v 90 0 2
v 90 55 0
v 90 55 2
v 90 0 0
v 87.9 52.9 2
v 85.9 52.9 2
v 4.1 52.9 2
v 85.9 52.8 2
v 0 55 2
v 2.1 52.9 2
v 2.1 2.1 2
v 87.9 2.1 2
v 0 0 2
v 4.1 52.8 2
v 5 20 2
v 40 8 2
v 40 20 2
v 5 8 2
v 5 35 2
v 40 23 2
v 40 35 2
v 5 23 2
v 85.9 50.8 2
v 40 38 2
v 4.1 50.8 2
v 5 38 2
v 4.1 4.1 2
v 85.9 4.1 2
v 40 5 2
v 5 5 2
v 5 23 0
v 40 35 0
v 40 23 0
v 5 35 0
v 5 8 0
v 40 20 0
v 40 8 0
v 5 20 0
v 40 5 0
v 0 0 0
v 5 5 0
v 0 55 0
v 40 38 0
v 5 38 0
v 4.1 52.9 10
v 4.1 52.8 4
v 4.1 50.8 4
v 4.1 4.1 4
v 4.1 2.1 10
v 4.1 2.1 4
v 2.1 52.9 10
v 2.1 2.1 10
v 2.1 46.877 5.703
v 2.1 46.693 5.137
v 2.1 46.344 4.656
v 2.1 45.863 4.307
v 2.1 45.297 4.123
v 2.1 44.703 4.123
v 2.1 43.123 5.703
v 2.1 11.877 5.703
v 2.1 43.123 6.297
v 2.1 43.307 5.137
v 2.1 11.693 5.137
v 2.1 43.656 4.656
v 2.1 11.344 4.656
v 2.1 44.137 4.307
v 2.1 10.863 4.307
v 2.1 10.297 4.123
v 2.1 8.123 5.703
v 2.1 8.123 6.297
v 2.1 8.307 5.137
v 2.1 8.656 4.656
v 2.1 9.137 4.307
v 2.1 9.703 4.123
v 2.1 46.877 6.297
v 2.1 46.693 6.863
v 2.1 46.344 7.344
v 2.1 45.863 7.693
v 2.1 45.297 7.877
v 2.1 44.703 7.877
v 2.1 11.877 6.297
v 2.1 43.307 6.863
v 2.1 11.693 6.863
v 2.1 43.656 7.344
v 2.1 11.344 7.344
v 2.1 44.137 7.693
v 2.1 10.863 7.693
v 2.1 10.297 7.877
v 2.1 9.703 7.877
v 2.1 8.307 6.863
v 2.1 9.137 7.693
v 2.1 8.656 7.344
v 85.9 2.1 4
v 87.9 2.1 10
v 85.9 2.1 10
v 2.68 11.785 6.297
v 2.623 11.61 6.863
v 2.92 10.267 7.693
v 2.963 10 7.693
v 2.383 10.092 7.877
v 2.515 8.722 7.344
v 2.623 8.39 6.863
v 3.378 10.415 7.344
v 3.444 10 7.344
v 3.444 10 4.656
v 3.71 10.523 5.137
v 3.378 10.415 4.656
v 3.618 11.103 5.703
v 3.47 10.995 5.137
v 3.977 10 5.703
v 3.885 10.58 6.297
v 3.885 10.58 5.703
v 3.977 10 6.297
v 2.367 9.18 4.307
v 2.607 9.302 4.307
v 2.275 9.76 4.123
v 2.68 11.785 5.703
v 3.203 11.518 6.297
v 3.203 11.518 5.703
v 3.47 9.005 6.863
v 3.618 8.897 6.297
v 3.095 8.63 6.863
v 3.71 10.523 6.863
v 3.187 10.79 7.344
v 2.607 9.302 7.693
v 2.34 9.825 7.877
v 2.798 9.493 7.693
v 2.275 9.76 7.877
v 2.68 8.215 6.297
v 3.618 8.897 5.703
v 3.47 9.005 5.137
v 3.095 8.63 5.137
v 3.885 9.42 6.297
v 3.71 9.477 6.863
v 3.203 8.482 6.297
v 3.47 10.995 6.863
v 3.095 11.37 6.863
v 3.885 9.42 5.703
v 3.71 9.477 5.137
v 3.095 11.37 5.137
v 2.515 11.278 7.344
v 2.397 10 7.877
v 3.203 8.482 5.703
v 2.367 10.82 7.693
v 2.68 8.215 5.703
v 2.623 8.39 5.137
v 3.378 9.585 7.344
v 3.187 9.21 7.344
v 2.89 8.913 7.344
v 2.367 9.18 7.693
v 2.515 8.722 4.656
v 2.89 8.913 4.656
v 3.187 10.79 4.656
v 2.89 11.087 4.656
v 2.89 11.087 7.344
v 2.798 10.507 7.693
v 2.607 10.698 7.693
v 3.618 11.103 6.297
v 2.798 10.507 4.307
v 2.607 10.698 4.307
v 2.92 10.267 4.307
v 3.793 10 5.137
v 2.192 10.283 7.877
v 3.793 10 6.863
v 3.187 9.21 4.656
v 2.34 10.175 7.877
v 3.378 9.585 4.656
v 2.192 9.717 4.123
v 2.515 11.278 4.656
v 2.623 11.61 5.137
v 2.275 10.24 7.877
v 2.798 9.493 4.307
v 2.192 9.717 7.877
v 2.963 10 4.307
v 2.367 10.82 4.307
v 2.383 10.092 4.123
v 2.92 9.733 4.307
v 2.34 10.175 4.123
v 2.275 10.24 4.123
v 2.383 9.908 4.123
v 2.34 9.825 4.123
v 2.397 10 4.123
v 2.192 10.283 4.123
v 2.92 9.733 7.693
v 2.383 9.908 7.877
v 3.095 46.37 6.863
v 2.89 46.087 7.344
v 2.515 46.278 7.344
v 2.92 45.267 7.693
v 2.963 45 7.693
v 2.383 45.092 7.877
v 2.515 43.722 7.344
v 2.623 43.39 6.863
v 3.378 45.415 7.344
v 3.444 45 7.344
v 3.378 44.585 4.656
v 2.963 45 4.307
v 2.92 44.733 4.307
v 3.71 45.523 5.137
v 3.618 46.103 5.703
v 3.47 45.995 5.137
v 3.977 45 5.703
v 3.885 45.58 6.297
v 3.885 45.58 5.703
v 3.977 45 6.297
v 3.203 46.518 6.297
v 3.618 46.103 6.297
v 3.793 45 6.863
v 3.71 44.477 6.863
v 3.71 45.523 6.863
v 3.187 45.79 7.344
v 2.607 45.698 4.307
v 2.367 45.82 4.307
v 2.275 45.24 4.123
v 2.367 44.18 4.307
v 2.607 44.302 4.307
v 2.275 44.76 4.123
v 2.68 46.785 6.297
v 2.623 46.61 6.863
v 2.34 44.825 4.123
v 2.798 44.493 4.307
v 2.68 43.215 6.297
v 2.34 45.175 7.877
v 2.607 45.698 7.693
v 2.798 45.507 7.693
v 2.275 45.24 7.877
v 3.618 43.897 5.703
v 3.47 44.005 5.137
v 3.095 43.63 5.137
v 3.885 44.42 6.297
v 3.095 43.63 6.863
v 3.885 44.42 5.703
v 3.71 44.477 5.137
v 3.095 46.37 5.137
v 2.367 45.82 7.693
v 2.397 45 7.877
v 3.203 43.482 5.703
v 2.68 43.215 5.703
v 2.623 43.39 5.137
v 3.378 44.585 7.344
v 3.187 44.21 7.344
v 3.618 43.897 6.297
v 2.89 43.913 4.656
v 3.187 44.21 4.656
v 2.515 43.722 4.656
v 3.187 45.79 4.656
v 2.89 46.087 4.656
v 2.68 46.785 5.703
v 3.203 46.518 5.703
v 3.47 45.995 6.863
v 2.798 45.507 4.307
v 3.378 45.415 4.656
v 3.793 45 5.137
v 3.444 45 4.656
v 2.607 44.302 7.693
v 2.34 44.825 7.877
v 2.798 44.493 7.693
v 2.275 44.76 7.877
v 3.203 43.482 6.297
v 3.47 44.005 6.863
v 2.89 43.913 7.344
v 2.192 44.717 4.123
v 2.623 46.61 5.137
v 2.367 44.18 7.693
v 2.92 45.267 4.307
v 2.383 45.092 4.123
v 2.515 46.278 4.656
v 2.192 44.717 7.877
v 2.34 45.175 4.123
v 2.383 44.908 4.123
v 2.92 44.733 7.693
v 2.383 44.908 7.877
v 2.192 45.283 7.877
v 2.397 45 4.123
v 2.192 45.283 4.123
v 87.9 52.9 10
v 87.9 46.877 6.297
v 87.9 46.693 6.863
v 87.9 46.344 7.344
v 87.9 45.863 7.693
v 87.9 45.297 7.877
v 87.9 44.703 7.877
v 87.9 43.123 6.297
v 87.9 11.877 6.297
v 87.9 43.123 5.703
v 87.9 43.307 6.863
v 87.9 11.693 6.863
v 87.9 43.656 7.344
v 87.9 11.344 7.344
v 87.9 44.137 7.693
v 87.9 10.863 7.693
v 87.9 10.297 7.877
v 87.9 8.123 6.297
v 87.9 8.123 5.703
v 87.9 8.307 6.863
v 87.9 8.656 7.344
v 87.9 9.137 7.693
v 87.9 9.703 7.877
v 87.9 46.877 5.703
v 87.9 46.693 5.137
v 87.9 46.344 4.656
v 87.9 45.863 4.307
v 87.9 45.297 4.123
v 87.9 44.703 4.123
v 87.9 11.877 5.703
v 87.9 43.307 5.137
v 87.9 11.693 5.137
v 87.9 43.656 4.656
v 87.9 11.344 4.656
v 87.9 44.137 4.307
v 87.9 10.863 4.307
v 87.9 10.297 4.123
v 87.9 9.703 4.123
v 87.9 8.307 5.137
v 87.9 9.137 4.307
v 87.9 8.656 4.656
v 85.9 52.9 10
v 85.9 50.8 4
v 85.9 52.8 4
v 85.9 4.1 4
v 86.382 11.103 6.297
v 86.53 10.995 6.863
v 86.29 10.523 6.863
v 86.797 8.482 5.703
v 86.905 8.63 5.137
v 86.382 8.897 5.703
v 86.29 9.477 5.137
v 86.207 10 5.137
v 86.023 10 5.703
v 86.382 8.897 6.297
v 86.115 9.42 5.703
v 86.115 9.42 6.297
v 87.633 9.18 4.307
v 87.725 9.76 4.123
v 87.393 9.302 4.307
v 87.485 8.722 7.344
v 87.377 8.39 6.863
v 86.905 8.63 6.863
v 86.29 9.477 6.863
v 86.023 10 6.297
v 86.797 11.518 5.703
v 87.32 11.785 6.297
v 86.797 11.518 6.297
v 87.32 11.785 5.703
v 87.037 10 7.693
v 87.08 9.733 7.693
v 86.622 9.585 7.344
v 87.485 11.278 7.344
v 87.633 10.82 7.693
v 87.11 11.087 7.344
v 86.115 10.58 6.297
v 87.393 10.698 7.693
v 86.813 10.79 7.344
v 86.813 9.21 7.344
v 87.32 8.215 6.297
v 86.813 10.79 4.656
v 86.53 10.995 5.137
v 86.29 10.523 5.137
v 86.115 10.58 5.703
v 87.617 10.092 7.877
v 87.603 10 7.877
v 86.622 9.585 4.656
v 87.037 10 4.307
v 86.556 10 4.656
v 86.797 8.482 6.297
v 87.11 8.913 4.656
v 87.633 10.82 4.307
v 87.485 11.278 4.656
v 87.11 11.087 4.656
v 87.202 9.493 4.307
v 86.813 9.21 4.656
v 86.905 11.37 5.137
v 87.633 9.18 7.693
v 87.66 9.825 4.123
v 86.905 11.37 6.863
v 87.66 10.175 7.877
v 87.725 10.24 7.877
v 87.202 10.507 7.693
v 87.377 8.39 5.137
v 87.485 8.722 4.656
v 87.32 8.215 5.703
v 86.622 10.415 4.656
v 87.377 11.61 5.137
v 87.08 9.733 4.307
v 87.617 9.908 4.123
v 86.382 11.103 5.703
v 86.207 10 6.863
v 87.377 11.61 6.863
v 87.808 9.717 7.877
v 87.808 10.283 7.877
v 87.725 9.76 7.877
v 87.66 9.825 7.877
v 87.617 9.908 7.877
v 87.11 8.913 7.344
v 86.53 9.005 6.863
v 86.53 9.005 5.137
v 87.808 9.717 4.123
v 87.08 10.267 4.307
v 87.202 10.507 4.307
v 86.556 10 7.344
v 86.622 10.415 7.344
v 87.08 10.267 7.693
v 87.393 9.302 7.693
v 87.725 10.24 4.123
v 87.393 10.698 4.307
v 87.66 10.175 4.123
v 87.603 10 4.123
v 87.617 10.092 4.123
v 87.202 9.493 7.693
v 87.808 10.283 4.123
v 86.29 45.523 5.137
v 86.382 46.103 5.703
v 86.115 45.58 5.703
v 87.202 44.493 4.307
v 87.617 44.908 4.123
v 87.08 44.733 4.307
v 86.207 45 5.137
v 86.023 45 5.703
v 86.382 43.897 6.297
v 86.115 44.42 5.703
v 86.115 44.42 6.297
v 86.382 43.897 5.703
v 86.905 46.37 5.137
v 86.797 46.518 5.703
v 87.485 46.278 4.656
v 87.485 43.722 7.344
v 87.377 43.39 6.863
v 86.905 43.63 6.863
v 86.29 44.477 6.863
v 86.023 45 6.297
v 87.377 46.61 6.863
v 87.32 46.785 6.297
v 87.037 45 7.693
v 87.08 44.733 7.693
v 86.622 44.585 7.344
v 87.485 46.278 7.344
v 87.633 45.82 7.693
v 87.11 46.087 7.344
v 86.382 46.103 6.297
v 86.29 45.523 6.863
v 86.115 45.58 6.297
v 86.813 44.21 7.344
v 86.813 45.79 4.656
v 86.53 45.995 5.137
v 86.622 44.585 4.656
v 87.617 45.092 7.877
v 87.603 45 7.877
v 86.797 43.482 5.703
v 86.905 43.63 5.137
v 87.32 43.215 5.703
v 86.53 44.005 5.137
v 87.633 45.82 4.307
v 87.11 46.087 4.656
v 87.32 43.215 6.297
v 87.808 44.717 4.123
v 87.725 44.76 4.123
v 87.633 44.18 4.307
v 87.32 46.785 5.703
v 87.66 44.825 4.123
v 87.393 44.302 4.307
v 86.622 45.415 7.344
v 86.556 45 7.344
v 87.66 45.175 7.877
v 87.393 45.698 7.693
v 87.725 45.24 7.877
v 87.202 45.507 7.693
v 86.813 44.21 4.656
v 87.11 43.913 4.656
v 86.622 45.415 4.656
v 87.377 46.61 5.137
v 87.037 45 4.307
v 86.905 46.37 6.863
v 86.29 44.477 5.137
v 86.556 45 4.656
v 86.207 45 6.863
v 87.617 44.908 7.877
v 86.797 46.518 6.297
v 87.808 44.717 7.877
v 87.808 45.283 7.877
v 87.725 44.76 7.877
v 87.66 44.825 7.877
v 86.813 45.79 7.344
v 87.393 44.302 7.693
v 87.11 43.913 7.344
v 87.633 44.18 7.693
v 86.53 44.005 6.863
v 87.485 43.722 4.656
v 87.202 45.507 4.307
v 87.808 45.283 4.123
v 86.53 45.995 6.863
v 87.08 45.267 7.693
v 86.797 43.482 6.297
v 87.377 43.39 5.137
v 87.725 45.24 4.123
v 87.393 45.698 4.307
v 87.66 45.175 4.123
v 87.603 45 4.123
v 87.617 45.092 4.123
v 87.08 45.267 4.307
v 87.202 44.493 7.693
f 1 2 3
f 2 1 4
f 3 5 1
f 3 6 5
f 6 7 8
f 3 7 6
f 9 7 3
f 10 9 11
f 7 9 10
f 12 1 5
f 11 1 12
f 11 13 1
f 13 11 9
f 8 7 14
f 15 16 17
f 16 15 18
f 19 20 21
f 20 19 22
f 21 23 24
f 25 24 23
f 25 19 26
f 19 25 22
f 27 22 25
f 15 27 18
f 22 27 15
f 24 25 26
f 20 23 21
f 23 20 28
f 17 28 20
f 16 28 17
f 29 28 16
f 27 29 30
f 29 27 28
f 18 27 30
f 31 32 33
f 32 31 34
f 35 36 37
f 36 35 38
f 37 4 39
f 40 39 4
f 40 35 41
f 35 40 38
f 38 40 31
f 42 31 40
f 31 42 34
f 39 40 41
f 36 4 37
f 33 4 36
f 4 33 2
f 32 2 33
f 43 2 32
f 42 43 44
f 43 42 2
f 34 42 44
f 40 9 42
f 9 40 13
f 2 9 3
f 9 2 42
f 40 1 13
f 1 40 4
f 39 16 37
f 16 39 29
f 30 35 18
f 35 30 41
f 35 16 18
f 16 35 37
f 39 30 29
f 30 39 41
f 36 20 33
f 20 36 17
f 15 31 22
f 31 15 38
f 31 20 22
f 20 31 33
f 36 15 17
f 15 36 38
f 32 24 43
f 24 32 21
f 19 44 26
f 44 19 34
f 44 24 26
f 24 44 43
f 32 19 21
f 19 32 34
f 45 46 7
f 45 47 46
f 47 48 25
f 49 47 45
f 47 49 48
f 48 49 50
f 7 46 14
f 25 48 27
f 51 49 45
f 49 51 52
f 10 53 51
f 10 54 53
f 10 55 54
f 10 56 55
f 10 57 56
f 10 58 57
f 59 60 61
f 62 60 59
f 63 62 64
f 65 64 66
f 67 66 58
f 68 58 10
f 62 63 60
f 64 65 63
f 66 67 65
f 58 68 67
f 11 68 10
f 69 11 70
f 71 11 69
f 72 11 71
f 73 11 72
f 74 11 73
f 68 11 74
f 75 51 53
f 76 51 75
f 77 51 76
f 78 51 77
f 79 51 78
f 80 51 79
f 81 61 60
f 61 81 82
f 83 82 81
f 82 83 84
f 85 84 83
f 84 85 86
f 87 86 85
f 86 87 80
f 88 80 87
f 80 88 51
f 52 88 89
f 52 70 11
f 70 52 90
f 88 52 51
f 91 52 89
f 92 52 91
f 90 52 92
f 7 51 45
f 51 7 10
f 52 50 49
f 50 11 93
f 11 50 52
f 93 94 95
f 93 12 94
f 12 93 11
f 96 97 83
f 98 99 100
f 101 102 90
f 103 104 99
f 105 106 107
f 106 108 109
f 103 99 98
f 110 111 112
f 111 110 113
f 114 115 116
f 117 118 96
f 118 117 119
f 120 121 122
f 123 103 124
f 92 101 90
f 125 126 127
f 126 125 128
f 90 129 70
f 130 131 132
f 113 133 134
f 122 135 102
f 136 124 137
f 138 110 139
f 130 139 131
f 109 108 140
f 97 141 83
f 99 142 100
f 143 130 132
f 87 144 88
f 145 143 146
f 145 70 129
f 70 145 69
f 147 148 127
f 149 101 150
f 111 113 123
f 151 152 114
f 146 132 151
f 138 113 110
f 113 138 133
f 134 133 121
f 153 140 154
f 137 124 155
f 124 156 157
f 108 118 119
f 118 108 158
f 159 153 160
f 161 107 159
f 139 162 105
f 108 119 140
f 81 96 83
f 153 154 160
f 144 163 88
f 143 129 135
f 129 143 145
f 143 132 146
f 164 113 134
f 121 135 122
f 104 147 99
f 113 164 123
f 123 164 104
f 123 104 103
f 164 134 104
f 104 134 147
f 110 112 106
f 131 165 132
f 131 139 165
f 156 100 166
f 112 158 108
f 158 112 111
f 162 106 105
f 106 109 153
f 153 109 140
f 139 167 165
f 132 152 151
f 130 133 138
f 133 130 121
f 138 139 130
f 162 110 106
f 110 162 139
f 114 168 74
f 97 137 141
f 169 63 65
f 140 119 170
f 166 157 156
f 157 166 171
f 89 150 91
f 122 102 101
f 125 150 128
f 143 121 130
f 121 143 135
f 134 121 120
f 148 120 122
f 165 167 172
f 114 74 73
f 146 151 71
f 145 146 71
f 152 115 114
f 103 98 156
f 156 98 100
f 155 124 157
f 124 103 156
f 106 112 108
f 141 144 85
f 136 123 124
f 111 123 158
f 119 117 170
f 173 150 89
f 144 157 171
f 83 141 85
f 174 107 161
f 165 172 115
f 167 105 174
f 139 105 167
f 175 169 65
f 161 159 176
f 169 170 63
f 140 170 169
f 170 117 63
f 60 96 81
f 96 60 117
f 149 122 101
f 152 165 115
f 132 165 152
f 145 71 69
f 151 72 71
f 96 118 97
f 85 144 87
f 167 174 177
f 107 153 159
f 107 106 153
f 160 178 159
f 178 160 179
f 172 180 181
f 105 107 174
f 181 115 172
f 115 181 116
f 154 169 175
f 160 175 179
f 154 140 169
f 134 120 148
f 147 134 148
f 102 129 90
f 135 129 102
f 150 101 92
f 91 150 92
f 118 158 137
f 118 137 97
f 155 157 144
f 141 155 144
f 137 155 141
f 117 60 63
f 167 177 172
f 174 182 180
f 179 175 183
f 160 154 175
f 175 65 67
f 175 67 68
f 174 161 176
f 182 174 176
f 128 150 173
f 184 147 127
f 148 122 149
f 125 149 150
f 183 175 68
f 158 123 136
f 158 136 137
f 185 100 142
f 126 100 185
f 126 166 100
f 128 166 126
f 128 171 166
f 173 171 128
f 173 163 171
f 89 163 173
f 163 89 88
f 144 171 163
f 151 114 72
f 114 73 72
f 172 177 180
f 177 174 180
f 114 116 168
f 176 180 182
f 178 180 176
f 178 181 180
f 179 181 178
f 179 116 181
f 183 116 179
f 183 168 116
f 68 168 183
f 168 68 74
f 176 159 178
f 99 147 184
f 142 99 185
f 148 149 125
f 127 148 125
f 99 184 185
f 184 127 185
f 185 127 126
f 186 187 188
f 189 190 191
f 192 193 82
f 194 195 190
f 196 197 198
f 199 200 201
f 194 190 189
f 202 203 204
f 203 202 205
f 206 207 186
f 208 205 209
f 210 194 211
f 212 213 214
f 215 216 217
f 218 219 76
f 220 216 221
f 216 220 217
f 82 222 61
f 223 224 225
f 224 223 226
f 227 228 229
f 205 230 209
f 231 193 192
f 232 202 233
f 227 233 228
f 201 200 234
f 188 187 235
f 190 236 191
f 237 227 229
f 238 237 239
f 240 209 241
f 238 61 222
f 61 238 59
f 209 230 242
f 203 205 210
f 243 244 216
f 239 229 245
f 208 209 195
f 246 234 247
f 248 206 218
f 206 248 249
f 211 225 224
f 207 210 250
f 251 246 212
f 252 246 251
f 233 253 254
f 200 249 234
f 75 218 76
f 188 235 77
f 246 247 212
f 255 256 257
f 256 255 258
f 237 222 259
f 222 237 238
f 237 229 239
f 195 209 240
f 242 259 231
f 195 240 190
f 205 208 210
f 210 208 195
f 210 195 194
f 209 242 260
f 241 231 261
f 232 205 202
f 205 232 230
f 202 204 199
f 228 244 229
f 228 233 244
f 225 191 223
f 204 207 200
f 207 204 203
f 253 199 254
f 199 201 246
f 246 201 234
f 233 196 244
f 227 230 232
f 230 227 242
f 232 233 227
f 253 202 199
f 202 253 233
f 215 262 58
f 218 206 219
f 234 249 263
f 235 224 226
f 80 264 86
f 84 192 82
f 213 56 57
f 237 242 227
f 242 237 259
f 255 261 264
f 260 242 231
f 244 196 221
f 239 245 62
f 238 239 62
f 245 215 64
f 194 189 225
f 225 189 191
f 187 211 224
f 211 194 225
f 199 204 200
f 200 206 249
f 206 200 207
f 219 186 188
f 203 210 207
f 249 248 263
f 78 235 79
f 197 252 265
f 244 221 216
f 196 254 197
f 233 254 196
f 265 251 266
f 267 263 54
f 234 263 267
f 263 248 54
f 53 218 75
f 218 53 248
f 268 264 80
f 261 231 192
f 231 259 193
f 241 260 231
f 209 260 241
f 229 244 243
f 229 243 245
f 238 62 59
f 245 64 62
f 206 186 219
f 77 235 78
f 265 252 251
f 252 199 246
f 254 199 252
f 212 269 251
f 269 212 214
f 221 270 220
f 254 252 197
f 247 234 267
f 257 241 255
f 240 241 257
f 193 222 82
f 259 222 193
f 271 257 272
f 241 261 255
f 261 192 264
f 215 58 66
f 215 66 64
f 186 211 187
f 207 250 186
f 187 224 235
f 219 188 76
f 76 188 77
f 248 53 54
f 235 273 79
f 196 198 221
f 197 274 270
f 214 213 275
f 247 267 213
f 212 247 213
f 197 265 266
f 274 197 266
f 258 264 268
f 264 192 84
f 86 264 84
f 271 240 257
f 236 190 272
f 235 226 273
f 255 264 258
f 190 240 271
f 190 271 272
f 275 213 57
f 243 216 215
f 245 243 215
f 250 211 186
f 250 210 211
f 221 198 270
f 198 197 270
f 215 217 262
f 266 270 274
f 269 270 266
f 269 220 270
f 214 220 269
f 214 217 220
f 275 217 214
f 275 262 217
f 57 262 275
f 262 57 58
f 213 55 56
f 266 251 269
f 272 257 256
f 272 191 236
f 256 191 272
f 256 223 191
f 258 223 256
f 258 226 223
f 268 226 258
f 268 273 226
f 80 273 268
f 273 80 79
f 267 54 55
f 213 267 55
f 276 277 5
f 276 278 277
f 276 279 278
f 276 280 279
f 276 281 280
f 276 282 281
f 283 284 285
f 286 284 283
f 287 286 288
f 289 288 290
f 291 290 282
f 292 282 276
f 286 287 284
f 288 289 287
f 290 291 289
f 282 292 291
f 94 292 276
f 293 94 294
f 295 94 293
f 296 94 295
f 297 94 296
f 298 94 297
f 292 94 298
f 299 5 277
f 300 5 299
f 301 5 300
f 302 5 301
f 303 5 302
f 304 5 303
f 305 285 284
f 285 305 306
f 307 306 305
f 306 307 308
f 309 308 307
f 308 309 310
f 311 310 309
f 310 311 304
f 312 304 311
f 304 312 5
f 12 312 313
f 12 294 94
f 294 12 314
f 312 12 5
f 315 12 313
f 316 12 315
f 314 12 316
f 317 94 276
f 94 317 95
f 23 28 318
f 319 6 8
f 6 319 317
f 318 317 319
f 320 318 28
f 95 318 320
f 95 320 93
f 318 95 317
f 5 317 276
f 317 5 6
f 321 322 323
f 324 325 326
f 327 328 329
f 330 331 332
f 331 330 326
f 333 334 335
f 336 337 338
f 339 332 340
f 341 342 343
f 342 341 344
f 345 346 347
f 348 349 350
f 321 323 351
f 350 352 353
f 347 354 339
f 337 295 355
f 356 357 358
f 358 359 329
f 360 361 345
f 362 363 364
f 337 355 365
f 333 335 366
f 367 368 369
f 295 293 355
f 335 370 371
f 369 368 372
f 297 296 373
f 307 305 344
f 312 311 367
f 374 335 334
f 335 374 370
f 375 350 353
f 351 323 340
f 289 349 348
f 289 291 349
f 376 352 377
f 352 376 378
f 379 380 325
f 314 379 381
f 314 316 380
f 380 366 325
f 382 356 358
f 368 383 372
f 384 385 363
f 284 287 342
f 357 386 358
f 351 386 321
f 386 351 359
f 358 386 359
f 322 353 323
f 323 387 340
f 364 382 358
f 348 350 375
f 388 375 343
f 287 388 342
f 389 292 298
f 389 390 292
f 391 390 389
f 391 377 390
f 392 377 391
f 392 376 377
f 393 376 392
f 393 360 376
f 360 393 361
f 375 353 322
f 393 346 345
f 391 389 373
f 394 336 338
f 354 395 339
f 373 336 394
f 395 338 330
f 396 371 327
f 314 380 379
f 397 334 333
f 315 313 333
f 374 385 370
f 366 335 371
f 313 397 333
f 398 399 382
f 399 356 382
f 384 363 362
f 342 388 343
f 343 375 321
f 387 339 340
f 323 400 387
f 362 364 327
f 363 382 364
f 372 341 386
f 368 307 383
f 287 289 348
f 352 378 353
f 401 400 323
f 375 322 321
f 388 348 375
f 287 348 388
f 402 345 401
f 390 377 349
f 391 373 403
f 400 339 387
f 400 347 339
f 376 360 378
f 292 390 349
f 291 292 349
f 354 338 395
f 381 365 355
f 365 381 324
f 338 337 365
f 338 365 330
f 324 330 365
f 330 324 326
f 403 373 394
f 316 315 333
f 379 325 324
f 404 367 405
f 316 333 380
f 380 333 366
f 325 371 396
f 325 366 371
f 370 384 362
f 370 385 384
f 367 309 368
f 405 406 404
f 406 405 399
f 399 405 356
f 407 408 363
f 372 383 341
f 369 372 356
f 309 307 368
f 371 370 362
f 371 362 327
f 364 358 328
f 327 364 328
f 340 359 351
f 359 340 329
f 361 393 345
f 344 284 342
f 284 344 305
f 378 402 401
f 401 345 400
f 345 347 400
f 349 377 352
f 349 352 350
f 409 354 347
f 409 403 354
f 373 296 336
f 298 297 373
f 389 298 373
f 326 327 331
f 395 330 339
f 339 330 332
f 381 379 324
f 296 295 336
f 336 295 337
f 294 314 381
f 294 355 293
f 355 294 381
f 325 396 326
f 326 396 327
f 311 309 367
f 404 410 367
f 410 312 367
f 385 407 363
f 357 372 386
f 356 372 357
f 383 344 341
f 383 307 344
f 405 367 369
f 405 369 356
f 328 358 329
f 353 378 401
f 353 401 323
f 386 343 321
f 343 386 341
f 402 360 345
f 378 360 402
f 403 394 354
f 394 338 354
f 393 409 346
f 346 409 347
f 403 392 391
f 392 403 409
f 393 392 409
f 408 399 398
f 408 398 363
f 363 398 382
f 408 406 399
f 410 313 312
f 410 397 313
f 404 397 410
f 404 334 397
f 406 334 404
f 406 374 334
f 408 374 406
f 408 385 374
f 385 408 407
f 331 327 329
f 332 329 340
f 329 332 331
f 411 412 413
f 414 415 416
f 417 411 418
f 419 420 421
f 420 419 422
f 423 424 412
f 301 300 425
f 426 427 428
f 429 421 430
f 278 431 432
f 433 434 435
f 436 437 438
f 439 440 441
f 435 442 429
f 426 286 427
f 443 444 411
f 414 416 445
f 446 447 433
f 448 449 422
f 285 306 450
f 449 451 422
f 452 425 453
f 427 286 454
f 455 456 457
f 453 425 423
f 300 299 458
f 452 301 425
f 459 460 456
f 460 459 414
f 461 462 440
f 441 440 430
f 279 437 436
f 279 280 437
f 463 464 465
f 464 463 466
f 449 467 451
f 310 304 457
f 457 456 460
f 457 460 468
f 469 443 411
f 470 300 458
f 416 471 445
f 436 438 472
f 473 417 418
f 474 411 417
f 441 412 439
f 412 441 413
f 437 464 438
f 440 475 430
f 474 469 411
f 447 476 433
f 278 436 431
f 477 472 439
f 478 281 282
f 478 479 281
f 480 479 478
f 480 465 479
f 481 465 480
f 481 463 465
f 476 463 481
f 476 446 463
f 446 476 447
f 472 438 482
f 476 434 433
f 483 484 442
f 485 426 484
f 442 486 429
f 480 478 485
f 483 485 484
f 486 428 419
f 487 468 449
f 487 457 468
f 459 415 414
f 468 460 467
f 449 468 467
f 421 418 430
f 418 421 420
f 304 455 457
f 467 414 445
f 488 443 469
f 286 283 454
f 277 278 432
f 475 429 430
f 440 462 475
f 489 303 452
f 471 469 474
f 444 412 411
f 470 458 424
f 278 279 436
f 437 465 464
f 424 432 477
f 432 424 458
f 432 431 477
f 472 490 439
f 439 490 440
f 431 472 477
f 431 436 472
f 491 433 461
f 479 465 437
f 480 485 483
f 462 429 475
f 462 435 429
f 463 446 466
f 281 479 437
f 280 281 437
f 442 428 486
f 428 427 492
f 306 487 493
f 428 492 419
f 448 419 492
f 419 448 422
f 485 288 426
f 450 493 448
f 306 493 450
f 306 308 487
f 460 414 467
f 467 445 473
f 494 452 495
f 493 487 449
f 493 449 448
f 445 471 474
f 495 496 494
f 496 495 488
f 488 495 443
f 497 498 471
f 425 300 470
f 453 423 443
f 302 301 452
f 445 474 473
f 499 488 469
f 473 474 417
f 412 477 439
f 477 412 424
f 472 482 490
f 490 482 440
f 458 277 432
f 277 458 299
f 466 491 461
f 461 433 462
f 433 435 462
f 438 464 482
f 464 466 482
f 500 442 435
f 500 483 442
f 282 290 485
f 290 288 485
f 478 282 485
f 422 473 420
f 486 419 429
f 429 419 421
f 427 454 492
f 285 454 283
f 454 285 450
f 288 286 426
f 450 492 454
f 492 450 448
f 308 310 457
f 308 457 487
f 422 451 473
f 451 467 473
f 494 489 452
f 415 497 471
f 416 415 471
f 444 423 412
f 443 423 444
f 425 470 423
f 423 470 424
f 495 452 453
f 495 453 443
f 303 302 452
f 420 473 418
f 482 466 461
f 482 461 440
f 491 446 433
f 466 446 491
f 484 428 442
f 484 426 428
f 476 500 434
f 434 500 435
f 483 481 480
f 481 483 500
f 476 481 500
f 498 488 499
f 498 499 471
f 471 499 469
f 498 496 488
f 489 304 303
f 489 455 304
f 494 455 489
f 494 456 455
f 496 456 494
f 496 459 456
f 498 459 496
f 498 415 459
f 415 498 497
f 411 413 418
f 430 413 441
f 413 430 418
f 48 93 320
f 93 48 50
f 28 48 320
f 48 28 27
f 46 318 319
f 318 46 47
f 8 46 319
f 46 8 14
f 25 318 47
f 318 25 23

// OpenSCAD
// Startpoint Router ground:

le=90;
br=55;
hr=25;
$fn=20;

union(){
    difference() {
      translate ([0,0,0])cube([le, br,2]);
      translate ([5,5,-0.5])cube([35, 3,3]);
      translate ([5,20,-0.5])cube([35, 3,3]);
      translate ([5,35,-0.5])cube([35, 3,3]);
    }
    translate ([2.1,2.1,0])cube([le-4.2, 2,4]);
    translate ([2.1,br-4.2,0])cube([le-4.2, 2,4]);

    difference() {
         translate ([2.1,2.1,0])cube([2, br-4.2,10]);
         translate ([2.1,10,6])sphere (d=3.8);
         translate ([2.1,br-10,6])sphere (d=3.8);
    }
    difference() {
         translate ([le-2-2.1,2.1,0])cube([2, br-4.2,10]);
         translate ([le-2.1,10,6])sphere (d=3.8);
         translate ([le-2.1,br-10,6])sphere (d=3.8);
    }
}
